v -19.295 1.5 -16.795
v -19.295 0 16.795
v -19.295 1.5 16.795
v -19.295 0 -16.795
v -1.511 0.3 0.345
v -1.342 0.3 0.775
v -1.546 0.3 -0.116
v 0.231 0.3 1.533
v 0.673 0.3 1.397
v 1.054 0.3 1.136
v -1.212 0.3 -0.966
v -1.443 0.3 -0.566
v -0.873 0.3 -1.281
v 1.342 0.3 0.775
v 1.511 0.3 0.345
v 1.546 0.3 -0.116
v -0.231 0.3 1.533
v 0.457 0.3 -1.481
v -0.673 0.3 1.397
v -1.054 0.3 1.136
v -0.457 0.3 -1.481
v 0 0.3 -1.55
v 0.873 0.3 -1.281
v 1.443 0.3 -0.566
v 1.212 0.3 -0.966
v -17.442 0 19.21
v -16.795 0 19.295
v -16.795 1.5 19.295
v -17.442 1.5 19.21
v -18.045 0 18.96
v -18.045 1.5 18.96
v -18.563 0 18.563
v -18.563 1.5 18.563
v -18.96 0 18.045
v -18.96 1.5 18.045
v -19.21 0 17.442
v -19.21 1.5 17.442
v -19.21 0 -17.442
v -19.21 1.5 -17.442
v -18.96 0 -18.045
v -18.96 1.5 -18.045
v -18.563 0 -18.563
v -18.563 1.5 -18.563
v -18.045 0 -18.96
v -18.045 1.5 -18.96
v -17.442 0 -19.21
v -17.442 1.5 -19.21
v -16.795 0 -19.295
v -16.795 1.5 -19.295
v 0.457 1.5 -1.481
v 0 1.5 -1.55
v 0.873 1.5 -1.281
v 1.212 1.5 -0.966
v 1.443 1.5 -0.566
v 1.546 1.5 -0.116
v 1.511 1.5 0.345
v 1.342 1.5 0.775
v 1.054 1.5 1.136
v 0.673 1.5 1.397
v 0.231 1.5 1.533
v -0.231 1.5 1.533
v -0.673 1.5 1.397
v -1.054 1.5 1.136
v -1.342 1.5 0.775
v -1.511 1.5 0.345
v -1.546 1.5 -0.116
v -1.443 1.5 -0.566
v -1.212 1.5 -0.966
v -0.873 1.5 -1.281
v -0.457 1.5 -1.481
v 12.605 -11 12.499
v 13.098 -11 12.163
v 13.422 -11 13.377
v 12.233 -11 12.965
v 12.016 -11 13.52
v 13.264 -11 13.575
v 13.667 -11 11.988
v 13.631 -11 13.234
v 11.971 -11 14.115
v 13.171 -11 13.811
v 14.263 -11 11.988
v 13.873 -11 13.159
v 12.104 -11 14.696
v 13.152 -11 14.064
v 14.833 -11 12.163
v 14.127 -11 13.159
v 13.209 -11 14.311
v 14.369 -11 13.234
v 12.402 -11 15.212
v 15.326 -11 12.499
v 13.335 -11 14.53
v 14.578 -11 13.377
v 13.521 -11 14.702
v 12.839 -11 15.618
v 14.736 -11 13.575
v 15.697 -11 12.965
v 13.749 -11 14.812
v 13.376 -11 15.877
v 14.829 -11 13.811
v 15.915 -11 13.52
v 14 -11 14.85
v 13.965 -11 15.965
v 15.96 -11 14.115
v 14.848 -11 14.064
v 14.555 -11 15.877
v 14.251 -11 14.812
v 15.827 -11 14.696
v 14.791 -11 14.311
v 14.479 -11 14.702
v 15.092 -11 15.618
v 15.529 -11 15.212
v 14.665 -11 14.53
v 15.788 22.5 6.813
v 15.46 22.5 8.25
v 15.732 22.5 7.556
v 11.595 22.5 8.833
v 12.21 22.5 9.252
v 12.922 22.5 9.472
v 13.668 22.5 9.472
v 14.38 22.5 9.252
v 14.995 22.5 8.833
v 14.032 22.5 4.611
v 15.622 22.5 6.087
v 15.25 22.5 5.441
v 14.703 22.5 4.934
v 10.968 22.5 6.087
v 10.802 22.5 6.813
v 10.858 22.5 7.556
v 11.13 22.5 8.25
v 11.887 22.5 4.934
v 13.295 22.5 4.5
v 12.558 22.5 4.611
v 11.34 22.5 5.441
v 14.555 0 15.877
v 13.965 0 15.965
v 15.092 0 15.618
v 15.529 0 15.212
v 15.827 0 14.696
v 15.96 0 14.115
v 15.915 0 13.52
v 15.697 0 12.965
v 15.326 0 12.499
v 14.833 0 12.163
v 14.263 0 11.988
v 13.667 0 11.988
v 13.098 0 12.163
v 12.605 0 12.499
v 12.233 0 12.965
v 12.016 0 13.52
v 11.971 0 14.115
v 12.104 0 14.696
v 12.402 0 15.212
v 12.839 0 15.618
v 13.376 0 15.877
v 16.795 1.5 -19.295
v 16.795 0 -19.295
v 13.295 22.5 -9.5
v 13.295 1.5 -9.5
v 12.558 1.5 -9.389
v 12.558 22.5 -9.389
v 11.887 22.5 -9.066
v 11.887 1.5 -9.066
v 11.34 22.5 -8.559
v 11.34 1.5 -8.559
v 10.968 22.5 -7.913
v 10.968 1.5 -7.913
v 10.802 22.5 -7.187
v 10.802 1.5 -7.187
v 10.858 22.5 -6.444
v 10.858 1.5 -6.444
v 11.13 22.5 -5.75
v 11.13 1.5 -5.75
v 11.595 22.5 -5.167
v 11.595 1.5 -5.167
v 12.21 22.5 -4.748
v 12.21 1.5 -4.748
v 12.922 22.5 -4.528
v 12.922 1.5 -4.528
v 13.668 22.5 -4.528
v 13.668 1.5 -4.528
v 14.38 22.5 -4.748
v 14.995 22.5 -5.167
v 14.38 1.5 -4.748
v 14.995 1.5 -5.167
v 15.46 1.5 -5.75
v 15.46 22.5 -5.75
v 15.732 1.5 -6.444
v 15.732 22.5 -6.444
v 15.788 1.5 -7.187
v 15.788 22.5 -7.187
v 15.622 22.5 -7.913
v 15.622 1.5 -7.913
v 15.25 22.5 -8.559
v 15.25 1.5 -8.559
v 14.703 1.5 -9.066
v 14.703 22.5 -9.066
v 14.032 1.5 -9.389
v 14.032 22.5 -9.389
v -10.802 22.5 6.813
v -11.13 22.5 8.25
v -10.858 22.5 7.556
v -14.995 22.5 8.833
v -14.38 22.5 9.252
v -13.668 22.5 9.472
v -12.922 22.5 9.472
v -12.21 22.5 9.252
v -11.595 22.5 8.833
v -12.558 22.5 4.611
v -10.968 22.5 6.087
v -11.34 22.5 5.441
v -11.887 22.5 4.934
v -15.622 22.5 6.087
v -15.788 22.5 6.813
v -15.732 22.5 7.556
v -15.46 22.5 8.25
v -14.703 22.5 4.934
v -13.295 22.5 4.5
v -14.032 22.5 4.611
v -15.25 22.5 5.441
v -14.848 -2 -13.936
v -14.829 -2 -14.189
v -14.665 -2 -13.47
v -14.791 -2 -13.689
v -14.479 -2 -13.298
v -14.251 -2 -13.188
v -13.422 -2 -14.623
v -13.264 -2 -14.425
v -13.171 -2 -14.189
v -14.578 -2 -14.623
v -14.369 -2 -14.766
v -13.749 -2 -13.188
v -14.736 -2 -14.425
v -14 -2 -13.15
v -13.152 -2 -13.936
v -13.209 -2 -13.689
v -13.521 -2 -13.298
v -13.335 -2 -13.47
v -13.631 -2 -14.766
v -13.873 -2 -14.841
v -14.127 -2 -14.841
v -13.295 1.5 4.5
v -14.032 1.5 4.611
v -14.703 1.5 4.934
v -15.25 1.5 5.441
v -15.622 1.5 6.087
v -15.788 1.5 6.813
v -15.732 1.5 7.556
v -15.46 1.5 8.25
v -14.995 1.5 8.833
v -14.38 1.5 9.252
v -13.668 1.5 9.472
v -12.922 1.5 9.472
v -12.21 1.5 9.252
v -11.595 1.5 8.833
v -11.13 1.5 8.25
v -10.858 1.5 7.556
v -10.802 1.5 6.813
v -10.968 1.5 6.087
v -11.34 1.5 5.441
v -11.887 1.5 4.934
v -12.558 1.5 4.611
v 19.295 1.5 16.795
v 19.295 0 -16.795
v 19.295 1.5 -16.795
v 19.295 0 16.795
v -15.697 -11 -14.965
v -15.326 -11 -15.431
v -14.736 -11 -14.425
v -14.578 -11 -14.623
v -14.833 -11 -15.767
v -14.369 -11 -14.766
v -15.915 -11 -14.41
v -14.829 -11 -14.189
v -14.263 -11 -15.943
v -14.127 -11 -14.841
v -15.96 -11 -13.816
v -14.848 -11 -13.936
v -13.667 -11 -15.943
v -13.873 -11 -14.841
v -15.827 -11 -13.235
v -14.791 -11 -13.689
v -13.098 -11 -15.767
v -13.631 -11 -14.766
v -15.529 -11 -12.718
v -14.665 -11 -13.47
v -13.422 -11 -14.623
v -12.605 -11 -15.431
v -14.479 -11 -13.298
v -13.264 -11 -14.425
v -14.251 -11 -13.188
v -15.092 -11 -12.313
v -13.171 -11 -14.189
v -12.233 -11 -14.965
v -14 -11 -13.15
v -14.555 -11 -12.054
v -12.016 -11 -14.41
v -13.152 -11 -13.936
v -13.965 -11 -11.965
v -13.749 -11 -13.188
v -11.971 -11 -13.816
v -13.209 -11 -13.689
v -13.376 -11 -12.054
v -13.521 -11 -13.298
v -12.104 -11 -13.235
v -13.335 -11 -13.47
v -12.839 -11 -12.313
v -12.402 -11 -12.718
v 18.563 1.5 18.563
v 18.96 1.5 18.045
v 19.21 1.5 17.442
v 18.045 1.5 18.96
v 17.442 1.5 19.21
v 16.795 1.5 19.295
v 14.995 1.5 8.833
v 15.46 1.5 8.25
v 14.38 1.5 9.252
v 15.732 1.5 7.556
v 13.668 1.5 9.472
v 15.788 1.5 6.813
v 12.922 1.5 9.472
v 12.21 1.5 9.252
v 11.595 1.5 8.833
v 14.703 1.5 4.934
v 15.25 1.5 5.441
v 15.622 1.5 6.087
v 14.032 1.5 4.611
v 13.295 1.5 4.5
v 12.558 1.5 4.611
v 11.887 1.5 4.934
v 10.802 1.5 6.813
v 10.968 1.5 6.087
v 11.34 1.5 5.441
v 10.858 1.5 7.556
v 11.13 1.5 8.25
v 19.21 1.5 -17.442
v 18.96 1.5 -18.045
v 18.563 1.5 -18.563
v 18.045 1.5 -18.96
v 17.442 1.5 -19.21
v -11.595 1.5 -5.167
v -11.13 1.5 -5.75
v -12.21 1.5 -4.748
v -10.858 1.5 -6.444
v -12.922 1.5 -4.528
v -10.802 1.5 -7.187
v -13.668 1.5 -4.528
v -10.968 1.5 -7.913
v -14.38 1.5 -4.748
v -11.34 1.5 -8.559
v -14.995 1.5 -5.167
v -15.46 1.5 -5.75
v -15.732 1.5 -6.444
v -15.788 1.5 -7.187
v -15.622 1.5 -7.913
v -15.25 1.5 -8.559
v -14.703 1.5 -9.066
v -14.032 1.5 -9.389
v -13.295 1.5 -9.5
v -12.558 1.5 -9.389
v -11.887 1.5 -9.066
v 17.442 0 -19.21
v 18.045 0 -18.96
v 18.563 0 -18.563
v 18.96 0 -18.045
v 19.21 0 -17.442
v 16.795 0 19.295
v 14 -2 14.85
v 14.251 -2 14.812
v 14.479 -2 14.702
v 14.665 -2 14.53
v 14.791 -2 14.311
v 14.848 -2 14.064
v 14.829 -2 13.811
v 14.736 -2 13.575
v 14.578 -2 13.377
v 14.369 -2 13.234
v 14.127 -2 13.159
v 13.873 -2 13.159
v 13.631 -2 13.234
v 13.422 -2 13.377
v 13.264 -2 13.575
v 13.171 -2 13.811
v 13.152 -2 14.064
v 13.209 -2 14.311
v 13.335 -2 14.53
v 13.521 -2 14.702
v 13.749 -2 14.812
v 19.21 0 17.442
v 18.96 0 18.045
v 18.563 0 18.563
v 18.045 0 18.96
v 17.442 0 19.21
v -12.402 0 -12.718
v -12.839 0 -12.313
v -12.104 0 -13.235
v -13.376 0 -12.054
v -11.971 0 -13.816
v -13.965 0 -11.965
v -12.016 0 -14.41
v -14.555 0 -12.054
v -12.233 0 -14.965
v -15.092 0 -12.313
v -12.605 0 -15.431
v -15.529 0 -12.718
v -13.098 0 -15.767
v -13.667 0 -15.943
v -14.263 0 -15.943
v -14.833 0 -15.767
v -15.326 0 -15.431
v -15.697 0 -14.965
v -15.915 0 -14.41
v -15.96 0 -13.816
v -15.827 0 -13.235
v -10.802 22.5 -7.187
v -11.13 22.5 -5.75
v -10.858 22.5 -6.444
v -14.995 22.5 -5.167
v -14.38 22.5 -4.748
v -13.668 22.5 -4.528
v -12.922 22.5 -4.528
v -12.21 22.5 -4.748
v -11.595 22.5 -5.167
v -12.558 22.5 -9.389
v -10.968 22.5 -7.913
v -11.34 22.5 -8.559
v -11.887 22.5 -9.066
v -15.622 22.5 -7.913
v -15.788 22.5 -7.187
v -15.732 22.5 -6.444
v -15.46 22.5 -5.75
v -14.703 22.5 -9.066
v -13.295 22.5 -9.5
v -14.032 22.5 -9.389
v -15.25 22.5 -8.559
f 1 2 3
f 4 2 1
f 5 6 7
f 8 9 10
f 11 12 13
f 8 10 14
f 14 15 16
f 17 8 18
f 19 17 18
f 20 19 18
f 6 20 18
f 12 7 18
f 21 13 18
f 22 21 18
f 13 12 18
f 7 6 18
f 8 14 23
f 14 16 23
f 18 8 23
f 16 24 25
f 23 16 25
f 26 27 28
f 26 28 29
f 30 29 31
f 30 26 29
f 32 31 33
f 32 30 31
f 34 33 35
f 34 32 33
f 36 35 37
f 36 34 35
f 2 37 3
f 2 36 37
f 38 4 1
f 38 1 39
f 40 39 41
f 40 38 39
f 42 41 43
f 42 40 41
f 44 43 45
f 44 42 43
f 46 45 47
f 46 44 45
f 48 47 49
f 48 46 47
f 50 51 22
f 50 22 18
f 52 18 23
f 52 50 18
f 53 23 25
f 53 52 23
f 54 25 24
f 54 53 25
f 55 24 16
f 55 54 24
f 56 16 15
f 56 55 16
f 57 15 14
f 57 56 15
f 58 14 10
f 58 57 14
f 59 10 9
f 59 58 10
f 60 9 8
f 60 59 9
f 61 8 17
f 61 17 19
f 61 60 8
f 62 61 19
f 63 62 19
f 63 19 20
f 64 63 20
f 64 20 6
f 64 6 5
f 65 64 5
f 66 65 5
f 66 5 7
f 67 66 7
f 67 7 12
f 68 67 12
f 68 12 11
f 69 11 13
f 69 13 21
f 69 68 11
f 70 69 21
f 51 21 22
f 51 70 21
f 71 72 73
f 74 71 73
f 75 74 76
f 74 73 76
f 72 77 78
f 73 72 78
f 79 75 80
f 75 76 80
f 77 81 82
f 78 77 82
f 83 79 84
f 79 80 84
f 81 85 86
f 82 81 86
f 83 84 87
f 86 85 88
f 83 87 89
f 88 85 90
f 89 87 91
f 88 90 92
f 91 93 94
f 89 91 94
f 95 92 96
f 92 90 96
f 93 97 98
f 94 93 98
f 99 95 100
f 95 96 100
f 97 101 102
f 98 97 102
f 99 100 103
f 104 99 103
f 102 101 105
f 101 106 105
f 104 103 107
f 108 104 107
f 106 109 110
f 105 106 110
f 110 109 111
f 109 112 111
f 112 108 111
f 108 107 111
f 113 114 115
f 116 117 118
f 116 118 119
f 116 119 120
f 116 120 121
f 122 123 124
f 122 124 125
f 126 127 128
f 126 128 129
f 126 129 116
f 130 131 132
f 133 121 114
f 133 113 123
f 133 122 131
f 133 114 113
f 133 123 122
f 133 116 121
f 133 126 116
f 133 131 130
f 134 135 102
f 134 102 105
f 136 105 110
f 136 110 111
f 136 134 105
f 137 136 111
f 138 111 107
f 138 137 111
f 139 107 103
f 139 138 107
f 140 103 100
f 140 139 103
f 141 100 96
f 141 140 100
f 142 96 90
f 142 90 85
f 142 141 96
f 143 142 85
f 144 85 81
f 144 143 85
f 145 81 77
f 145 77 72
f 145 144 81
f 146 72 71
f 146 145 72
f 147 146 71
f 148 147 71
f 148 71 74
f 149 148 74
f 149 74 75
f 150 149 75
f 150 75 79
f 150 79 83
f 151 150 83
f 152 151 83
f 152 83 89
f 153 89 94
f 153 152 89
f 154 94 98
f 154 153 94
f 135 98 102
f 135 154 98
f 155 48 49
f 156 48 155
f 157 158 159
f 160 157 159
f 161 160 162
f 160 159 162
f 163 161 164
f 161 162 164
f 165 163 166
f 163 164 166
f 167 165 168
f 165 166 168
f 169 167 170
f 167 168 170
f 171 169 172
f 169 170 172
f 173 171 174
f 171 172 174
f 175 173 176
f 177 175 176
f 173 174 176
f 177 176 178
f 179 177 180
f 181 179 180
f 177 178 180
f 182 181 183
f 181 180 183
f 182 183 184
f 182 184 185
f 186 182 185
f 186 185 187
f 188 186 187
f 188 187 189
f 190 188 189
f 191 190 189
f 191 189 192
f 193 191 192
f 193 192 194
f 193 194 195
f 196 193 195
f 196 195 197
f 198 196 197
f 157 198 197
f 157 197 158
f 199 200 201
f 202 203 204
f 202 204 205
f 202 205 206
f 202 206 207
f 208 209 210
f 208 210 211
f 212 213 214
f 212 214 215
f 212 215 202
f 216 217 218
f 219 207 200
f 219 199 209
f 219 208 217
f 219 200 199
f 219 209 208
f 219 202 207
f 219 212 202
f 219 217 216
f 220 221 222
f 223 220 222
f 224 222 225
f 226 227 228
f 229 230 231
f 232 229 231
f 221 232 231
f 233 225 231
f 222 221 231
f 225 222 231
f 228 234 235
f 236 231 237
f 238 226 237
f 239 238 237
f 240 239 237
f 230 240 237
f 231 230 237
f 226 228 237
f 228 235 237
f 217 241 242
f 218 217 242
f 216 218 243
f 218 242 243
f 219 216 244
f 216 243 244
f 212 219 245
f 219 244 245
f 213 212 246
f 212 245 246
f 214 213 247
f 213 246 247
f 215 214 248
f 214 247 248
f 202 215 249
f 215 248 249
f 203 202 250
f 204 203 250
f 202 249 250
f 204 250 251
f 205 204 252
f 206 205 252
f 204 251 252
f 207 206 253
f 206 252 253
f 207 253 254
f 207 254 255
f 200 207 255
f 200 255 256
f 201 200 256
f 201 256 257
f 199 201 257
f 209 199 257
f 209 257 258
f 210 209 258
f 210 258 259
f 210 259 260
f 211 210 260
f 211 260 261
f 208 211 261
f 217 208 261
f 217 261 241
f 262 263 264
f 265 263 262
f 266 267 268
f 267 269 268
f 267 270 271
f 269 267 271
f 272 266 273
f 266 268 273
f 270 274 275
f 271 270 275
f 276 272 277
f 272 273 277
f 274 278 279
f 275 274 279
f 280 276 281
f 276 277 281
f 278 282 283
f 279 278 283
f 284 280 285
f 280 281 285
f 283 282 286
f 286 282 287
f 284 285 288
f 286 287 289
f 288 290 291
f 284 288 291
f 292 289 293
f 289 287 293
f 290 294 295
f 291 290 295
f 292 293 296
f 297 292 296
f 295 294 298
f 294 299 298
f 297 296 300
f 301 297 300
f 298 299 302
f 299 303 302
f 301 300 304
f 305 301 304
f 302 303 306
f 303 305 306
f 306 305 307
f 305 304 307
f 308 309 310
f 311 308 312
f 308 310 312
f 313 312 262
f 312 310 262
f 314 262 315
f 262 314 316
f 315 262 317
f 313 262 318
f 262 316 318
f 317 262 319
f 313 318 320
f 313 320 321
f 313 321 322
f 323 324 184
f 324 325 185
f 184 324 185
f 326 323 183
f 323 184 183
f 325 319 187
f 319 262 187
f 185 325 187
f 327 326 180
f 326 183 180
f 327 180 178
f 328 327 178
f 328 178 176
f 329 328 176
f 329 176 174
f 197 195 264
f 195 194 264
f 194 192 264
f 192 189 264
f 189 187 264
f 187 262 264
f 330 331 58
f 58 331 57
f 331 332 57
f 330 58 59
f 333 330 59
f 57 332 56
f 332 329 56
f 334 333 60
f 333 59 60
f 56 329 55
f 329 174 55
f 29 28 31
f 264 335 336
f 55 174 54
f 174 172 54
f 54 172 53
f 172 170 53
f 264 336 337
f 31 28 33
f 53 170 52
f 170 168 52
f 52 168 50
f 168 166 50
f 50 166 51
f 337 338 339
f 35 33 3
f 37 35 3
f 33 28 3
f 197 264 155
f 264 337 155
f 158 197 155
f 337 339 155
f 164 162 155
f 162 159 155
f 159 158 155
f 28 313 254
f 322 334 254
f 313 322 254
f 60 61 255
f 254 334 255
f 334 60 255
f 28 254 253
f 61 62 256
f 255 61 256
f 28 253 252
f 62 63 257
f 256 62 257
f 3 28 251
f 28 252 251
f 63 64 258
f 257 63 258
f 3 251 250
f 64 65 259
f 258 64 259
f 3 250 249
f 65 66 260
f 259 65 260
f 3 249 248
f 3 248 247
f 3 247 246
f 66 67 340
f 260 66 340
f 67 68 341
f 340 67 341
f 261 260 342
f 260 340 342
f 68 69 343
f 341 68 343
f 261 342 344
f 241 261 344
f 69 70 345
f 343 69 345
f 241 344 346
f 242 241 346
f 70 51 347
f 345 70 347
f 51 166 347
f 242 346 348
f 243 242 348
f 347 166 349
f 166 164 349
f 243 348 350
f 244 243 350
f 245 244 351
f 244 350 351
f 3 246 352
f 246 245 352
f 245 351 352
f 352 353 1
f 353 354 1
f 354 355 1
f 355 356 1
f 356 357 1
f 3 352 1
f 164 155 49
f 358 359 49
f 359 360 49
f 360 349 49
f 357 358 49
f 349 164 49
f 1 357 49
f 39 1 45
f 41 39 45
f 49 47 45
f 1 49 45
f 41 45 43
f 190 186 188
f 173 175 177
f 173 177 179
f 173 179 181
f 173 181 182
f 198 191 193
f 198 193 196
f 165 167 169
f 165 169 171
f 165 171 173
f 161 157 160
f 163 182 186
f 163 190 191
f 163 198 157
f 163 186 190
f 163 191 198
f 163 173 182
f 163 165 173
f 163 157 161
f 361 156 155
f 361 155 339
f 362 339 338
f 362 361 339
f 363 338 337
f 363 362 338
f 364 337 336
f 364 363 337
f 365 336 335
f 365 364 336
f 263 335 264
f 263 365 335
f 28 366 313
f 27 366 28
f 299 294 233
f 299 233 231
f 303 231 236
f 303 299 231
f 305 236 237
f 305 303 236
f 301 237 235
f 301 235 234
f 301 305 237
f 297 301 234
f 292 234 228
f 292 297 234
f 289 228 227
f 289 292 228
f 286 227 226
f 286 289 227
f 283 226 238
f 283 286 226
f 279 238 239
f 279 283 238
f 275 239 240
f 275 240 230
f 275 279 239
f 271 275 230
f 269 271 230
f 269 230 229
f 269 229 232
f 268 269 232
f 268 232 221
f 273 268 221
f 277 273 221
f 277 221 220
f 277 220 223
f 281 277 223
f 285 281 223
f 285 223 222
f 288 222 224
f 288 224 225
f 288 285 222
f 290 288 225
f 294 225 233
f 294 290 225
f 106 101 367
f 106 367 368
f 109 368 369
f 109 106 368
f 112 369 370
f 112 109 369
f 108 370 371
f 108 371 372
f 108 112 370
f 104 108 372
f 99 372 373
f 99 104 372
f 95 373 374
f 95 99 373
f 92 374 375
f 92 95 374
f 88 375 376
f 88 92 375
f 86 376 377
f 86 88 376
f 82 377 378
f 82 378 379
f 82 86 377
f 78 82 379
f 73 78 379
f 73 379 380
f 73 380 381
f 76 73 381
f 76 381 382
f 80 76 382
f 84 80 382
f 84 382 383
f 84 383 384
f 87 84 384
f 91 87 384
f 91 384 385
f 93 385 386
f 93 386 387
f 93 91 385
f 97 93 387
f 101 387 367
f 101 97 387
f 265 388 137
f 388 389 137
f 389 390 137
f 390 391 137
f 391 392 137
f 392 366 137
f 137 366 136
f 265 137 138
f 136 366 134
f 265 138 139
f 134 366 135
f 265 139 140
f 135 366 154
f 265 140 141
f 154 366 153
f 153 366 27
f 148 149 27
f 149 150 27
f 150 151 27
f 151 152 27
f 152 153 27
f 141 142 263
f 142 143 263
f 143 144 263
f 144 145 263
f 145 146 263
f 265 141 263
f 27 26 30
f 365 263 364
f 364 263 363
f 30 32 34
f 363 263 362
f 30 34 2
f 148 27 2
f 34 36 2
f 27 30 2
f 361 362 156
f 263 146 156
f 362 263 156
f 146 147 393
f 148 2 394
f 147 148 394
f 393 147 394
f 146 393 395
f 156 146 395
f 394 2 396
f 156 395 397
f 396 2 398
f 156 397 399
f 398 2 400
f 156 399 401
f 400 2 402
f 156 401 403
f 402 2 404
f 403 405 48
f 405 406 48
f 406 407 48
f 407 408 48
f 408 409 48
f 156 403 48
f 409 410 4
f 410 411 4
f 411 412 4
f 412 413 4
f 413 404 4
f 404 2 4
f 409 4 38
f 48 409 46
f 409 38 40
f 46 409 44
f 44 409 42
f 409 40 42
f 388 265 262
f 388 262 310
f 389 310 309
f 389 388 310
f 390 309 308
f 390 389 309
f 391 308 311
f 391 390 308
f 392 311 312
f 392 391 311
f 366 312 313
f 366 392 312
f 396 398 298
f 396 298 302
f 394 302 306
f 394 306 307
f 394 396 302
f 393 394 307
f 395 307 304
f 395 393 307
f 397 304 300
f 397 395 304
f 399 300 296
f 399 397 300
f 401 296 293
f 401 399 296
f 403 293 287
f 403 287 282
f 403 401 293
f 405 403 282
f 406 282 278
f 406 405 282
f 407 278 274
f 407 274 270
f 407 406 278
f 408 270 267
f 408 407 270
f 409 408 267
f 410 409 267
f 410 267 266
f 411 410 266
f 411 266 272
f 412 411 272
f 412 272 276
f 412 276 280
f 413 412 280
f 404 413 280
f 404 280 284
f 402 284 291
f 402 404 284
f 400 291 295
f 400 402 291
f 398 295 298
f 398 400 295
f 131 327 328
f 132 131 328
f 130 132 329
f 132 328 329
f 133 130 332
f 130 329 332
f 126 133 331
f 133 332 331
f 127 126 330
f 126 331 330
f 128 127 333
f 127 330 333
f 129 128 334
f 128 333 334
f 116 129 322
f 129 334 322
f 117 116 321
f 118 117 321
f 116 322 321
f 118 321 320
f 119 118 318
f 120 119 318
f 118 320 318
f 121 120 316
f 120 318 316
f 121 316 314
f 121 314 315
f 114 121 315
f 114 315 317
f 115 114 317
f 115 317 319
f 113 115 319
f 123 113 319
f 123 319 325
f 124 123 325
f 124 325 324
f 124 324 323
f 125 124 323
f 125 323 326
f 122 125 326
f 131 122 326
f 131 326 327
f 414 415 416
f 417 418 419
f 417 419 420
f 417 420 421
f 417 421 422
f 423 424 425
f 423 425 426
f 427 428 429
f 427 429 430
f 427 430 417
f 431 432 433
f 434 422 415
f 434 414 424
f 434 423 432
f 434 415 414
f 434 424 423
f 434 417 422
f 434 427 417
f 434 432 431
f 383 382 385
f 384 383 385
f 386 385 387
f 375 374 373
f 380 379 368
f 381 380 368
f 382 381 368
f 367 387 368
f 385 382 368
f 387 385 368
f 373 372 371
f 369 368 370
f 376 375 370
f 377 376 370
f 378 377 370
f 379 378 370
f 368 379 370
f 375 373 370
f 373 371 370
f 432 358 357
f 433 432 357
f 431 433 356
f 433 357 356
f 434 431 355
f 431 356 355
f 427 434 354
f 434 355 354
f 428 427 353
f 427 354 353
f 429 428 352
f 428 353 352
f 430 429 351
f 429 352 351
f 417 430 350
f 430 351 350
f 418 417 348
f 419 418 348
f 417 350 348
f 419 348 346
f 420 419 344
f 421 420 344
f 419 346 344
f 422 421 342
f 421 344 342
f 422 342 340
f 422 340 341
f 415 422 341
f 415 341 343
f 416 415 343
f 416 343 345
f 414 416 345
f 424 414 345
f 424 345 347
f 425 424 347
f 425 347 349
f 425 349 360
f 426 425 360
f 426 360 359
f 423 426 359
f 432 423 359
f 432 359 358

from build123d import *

# Parameters (mm, degrees)
DODANIE_WYCI_GNI_CIE1_DEPTH = 1.5
SZKIC1_4_R                  = 2.5
DODANIE_WYCI_GNI_CIE2_DEPTH = 22.5
SZKIC3_R                    = 1.55
WYTNIJ_WYCI_GNI_CIE2_DEPTH  = 1.2
SZKIC1_5_R                  = 2
DODANIE_WYCI_GNI_CIE3_DEPTH = 11
SZKIC2_R                    = 0.85
WYTNIJ_WYCI_GNI_CIE3_DEPTH  = 9


with BuildPart() as part:
    # Szkic1 → Dodanie-wyciągnięcie1 (new body)
    with BuildSketch(Plane(origin=(0, 0, 0), x_dir=(1, 0, 0), z_dir=(0, 1, 0))):
        with BuildLine():
            Line((16.795, -19.295), (-16.795, -19.295))
            ThreePointArc((-16.795, -19.295), (-18.562766953, -18.562766953), (-19.295, -16.795))
            Line((-19.295, -16.795), (-19.295, 16.795))
            ThreePointArc((-19.295, 16.795), (-18.562766953, 18.562766953), (-16.795, 19.295))
            Line((-16.795, 19.295), (16.795, 19.295))
            ThreePointArc((16.795, 19.295), (18.562766953, 18.562766953), (19.295, 16.795))
            Line((19.295, 16.795), (19.295, -16.795))
            ThreePointArc((19.295, -16.795), (18.562766953, -18.562766953), (16.795, -19.295))
        make_face()
    extrude(amount=DODANIE_WYCI_GNI_CIE1_DEPTH)

    # Szkic1<4> → Dodanie-wyciągnięcie2 (add)
    with BuildSketch(Plane(origin=(0, 0, 0), x_dir=(1, 0, 0), z_dir=(0, 1, 0))):
        with Locations((13.295, 7)):
            Circle(SZKIC1_4_R)
        with Locations((-13.295, 7)):
            Circle(SZKIC1_4_R)
        with Locations((13.295, -7)):
            Circle(SZKIC1_4_R)
        with Locations((-13.295, -7)):
            Circle(SZKIC1_4_R)
    extrude(amount=DODANIE_WYCI_GNI_CIE2_DEPTH)

    # Szkic3 → Wytnij-wyciągnięcie2 (cut)
    with BuildSketch(Plane.XZ.offset(-1.5)):
        Circle(SZKIC3_R)
    extrude(amount=WYTNIJ_WYCI_GNI_CIE2_DEPTH, mode=Mode.SUBTRACT)

    # Szkic1<5> → Dodanie-wyciągnięcie3 (add)
    with BuildSketch(Plane(origin=(0, 0, 0), x_dir=(1, 0, 0), z_dir=(0, 1, 0))):
        with Locations((13.965358928, -13.965358928)):
            Circle(SZKIC1_5_R)
        with Locations((-13.965358928, 13.965358928)):
            Circle(SZKIC1_5_R)
    extrude(amount=-DODANIE_WYCI_GNI_CIE3_DEPTH)

    # Szkic2 → Wytnij-wyciągnięcie3 (cut)
    with BuildSketch(Plane(origin=(0, -11, 0), x_dir=(1, 0, 0), z_dir=(0, 1, 0))):
        with Locations((-14, 14)):
            Circle(SZKIC2_R)
        with Locations((14, -14)):
            Circle(SZKIC2_R)
    extrude(amount=WYTNIJ_WYCI_GNI_CIE3_DEPTH, mode=Mode.SUBTRACT)


solid = part.part
